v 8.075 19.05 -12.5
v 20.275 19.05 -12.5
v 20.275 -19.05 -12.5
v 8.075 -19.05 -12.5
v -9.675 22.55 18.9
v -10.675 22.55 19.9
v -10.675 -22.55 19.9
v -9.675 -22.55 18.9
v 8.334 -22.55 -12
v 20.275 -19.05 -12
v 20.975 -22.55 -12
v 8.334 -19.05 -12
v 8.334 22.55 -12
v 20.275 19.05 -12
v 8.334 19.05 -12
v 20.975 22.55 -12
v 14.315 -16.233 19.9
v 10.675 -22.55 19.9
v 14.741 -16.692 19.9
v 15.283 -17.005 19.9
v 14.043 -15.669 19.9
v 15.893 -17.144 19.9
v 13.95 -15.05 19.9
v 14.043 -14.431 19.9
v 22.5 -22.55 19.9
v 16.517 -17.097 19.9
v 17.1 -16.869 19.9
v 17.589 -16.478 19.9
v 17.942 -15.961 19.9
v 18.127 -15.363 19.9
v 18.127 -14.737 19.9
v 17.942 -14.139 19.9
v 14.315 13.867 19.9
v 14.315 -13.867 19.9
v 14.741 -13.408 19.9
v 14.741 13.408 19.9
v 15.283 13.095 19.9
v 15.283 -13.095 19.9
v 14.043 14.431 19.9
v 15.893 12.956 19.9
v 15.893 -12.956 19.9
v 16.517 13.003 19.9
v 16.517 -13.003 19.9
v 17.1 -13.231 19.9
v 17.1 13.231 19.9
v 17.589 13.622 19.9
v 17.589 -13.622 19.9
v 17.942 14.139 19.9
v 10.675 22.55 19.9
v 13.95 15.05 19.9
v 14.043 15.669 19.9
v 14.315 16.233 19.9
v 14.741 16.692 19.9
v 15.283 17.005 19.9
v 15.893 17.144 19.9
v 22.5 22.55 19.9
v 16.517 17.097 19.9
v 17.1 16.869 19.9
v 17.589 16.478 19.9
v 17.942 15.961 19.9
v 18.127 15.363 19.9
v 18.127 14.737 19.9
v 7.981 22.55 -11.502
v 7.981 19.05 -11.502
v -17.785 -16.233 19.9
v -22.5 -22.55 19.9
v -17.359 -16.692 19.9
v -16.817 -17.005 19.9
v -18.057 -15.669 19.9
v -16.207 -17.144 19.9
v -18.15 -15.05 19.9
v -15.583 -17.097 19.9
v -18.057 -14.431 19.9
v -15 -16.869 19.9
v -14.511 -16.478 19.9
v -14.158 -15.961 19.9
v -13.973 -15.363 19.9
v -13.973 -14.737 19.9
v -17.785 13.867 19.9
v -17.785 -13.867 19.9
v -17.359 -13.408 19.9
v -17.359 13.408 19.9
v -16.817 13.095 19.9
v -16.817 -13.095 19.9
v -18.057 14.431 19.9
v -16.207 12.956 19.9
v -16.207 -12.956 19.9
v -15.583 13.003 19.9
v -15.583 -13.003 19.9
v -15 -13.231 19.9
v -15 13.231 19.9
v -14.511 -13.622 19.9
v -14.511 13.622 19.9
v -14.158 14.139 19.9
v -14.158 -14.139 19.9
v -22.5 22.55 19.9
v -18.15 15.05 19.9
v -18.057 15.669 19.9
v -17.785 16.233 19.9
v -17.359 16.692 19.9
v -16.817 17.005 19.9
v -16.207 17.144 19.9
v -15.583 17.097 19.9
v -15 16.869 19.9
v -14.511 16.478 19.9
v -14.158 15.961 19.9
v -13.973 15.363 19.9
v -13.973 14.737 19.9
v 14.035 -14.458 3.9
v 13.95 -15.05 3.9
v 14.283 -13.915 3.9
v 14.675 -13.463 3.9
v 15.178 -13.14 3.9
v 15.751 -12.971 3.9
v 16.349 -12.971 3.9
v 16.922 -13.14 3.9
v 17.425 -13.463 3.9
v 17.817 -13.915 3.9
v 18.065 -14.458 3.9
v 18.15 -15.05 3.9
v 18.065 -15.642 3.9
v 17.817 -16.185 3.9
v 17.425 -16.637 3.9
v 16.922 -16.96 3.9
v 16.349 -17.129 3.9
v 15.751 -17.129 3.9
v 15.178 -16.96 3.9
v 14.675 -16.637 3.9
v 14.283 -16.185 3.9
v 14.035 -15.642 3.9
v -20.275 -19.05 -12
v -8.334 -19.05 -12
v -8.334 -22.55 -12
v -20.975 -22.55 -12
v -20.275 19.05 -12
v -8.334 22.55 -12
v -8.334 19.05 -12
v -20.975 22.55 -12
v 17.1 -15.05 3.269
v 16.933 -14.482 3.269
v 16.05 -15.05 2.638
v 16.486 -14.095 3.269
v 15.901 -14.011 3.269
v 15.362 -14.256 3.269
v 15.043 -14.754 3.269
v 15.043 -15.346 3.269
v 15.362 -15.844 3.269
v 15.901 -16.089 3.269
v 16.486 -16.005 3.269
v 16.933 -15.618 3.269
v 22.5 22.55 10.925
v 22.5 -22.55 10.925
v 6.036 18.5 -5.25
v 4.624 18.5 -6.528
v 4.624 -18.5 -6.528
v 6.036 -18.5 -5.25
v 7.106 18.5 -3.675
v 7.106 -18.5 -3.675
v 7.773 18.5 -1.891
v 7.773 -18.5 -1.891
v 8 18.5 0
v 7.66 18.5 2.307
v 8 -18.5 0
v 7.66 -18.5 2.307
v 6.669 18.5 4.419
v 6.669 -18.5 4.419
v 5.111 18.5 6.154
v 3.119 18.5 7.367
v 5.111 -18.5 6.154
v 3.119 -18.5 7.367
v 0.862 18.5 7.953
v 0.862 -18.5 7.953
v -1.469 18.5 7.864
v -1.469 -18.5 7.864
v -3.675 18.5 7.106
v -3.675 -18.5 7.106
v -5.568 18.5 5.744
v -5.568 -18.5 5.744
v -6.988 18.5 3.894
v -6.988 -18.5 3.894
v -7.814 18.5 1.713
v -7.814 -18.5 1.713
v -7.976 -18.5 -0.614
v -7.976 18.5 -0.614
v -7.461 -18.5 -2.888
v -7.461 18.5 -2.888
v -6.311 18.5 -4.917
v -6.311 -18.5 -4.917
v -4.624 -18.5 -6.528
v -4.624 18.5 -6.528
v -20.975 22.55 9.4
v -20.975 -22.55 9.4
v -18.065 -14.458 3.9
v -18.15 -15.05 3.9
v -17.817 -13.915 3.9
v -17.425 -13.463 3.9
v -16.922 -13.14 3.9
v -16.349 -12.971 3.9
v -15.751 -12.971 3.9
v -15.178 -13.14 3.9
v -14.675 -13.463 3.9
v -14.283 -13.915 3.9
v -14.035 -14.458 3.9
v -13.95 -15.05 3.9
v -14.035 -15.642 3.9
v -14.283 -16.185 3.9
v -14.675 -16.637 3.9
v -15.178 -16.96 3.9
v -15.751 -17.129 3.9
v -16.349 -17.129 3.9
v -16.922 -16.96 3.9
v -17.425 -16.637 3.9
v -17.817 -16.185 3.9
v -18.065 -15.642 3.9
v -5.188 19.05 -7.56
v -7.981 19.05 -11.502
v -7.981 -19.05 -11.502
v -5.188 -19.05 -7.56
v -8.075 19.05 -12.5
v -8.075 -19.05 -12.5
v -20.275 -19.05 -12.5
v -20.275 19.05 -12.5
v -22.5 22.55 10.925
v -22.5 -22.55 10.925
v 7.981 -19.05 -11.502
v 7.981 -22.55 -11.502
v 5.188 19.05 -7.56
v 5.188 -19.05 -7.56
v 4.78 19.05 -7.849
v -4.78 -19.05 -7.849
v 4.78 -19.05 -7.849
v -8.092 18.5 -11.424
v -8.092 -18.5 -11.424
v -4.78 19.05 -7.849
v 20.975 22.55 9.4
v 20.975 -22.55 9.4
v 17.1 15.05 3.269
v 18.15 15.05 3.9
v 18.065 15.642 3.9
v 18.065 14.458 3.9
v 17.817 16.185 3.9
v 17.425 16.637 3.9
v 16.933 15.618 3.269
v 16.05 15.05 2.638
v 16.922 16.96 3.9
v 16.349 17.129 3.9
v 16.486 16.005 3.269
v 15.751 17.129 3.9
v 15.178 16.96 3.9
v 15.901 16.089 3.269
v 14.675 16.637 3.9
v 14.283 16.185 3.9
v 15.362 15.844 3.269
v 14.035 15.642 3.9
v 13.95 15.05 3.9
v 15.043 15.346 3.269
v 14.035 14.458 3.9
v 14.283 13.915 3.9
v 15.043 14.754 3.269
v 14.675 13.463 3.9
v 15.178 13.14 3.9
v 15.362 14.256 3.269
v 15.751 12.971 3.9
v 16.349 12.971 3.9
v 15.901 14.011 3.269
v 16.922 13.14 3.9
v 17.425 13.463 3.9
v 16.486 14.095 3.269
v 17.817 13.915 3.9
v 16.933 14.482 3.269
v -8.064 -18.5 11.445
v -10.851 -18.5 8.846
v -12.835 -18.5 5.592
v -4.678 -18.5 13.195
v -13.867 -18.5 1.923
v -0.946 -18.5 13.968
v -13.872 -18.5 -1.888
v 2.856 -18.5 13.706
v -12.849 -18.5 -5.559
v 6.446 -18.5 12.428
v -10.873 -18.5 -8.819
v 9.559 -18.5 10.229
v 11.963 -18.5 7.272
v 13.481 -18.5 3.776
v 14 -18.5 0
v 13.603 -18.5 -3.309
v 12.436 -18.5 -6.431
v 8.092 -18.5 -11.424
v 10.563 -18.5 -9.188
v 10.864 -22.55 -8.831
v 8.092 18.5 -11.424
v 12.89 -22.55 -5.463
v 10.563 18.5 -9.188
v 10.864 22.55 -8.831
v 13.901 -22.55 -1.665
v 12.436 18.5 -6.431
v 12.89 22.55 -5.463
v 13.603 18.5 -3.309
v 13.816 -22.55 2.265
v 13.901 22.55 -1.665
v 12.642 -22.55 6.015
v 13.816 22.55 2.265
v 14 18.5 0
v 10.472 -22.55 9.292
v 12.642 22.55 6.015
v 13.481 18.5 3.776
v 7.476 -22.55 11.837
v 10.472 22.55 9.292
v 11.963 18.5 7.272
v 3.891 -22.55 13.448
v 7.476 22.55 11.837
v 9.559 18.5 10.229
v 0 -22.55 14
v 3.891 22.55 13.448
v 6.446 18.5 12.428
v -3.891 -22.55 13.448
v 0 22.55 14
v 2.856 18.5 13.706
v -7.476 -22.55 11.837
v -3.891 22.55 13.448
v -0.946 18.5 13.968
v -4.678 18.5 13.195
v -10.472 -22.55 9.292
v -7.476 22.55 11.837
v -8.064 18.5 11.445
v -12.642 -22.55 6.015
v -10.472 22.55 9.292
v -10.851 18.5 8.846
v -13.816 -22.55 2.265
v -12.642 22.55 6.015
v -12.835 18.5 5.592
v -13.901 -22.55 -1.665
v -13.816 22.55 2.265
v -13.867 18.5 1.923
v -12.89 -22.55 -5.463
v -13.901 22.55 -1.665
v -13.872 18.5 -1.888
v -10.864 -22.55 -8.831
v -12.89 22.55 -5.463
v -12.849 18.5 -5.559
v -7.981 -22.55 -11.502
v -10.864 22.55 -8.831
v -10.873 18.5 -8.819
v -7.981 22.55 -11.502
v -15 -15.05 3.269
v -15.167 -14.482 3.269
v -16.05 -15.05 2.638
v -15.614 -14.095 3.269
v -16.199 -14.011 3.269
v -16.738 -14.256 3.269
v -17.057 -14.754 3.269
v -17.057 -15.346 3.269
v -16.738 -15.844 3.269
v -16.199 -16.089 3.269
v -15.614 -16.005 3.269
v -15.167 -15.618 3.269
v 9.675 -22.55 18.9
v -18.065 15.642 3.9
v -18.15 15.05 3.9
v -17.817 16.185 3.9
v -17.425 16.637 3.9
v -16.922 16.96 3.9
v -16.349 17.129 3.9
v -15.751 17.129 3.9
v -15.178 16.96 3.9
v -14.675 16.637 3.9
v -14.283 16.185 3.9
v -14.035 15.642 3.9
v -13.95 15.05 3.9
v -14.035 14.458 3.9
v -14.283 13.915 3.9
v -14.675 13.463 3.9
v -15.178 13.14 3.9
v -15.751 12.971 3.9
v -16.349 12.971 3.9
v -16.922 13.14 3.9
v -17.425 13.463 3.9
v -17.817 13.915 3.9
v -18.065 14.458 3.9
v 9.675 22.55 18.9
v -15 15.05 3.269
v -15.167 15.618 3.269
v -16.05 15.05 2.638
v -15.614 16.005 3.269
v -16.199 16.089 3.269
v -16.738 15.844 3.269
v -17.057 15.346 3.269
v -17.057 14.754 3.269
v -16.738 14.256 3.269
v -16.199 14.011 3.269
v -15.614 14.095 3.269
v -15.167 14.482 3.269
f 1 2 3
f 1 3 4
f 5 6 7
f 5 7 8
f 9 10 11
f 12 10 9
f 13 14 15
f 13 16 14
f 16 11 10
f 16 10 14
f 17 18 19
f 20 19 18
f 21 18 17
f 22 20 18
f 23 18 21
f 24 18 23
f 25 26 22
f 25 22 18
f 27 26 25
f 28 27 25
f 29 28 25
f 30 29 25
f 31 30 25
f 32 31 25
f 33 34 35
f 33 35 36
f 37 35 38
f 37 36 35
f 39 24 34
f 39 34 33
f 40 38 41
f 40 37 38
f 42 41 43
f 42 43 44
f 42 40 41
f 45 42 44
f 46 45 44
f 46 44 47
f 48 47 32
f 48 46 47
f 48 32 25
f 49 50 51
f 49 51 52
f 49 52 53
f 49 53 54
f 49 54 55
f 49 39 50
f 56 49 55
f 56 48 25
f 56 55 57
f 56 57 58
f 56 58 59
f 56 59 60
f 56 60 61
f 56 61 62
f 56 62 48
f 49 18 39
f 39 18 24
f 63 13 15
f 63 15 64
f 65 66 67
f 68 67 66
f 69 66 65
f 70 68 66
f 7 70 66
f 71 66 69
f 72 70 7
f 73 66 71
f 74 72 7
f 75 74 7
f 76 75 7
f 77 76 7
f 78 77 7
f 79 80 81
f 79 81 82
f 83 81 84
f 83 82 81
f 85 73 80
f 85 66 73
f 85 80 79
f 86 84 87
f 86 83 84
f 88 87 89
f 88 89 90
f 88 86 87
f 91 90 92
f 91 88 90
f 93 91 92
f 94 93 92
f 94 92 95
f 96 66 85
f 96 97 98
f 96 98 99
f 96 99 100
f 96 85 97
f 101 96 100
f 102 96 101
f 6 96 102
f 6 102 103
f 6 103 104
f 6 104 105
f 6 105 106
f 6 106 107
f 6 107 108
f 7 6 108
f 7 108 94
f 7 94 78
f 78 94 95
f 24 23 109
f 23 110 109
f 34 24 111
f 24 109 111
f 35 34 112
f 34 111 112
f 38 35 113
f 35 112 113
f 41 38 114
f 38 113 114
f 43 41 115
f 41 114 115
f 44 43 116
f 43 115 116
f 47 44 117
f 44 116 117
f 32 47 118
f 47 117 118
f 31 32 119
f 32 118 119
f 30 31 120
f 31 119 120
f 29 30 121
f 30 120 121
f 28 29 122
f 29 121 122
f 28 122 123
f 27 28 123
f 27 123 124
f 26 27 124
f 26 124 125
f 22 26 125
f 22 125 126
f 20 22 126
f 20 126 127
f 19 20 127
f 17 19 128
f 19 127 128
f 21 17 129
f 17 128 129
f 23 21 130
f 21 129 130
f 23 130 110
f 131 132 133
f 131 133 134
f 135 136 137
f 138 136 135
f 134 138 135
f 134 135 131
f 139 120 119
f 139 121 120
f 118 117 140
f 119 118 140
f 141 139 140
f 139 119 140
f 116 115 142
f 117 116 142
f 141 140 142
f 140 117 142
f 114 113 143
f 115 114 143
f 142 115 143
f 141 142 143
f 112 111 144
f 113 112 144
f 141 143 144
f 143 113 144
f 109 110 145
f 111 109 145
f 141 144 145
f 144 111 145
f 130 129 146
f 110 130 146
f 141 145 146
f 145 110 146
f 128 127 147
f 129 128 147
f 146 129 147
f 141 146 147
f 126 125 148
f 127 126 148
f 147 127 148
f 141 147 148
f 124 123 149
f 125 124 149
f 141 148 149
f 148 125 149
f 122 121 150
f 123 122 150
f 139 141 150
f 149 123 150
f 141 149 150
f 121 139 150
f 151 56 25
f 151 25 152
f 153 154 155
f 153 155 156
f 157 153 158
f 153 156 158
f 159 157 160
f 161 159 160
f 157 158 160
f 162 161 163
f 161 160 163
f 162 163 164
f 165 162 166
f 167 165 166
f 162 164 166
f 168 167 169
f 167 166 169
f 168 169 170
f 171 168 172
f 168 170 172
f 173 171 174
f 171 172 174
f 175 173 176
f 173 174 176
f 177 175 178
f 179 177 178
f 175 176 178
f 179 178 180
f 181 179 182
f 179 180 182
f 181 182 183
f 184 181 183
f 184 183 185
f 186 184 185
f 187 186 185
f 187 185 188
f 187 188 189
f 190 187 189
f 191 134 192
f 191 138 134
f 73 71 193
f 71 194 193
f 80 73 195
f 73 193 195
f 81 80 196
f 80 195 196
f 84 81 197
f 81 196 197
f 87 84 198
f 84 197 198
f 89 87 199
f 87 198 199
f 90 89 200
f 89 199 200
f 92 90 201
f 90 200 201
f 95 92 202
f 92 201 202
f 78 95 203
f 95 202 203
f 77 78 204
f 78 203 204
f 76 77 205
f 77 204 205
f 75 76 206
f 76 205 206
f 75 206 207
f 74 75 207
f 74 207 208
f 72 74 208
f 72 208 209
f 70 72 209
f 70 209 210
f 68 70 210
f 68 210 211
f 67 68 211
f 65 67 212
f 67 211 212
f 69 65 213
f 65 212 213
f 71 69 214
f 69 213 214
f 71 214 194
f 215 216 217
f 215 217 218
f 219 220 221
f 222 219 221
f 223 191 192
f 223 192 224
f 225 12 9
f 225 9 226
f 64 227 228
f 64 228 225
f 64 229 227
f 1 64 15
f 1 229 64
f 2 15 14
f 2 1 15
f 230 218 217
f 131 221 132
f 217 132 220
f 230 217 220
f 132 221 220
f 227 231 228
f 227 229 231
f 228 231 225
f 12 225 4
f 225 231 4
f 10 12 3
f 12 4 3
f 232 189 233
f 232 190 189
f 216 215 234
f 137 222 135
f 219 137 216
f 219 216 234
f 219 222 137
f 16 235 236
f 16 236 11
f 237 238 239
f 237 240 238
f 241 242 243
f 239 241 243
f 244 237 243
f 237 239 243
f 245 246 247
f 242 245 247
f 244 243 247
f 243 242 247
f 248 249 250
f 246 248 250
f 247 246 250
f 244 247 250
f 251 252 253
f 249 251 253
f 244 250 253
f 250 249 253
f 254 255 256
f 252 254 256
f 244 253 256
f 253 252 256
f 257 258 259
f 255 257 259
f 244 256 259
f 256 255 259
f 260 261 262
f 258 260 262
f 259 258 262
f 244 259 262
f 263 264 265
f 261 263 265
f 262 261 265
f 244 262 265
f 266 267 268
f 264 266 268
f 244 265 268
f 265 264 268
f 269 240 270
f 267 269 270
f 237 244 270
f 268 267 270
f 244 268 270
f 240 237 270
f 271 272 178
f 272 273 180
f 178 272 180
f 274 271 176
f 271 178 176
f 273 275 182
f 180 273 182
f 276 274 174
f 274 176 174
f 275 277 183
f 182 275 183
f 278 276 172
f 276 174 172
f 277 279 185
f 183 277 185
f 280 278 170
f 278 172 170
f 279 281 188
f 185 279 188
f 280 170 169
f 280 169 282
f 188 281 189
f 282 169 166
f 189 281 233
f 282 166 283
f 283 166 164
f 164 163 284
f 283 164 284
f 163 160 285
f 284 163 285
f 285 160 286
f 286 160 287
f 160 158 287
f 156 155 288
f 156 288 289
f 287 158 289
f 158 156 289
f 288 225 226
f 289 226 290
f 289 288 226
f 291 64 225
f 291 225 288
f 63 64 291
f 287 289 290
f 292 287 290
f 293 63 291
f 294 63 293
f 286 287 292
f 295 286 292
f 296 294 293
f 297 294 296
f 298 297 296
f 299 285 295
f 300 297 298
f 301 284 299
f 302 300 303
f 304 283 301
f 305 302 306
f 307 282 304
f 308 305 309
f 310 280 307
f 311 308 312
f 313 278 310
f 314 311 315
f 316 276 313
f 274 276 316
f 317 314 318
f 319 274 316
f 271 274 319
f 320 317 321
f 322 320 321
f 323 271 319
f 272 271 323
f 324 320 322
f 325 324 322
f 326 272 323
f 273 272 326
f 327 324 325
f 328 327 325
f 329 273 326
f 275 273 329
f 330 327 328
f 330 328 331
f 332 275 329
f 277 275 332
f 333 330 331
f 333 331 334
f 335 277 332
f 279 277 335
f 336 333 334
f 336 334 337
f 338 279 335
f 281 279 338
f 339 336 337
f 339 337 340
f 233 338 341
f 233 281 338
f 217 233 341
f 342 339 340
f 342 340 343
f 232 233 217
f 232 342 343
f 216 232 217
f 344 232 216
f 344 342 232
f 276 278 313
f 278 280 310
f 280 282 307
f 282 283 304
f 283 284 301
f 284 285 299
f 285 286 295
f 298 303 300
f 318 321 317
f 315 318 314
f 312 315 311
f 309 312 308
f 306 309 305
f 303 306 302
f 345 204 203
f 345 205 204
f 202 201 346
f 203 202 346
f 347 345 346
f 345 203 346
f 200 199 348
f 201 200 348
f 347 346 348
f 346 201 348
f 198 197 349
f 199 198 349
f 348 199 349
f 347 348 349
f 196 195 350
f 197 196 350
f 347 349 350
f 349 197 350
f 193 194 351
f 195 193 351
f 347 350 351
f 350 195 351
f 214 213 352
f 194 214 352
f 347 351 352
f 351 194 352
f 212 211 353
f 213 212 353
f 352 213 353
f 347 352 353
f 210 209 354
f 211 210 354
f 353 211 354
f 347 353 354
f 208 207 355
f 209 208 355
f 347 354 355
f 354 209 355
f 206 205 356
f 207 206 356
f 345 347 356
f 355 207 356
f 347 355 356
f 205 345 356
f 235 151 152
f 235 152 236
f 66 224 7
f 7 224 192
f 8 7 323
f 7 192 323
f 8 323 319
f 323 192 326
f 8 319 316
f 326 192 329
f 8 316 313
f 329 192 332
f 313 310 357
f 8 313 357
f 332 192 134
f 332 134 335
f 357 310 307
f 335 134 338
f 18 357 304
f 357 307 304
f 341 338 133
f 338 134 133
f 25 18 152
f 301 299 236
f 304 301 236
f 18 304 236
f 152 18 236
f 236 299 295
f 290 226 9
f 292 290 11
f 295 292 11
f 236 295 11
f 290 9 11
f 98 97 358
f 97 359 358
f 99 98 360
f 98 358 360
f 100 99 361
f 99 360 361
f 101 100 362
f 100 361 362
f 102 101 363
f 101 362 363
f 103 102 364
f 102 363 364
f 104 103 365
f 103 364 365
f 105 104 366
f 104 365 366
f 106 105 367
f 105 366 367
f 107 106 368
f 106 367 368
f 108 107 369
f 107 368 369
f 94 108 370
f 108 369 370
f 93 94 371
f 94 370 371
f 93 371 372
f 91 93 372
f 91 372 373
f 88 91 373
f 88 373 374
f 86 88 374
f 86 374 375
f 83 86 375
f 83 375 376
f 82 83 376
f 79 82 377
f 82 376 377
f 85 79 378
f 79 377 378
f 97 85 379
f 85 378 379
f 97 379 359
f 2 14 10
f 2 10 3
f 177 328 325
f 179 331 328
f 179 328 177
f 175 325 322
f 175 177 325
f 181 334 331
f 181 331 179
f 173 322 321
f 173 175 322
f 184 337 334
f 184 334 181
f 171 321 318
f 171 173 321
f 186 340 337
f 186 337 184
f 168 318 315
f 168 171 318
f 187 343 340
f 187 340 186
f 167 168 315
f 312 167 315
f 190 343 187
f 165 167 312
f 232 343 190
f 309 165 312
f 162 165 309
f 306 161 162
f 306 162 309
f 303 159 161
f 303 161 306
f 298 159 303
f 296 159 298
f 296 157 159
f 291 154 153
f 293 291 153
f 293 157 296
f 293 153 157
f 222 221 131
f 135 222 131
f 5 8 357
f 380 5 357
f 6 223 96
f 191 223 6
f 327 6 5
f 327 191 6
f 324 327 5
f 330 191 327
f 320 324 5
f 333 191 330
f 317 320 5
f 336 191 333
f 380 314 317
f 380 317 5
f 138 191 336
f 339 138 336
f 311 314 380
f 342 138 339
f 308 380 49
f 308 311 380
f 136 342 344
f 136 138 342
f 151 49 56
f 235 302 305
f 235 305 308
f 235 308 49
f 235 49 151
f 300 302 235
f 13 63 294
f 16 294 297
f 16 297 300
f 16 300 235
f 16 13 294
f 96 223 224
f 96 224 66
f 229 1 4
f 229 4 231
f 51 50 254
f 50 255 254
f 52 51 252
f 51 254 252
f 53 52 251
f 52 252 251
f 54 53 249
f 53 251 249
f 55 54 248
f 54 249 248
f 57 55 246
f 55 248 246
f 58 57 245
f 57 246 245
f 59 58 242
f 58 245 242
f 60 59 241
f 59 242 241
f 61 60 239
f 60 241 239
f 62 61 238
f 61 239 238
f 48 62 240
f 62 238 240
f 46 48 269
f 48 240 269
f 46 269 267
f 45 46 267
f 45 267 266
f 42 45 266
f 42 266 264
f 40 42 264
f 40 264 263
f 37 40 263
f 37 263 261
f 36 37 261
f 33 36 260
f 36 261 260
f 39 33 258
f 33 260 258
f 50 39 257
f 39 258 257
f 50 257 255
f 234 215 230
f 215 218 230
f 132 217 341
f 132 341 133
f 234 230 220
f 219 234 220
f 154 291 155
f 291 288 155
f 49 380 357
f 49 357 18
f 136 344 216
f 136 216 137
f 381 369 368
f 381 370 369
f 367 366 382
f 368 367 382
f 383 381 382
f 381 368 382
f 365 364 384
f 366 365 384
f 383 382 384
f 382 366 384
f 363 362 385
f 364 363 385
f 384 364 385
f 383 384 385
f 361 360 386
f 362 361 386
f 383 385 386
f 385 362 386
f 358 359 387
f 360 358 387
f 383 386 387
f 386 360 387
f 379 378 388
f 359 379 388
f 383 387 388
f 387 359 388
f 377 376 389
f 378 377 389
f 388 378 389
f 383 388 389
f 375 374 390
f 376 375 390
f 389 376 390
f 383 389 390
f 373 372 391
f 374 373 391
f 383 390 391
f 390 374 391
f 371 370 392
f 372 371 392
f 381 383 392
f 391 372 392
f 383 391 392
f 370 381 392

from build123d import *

# Parameters (mm, degrees)
MAIN_BODY_DEPTH             = 22.55
RUBBER_BEARING_SLEEVE_DEPTH = 18.5
BOSS_EXTRUDE3_DEPTH         = 19.05
M5X0_8_TAPPED_HOLE1_D       = 4.2
M5X0_8_TAPPED_HOLE1_DEPTH   = 16
M5X0_8_TAPPED_HOLE1_TIP     = 1.2618073


with BuildPart() as part:
    # Sketch1 → Main Body (new, symmetric)
    with BuildSketch(Plane(origin=(0, 0, 0), x_dir=(1, 0, 0), z_dir=(0, 1, 0))):
        with BuildLine():
            Line((-20.975, 12), (-20.975, -9.4))
            Line((-20.975, -9.4), (-22.5, -10.925))
            Line((-22.5, -10.925), (-22.5, -19.9))
            Line((-22.5, -19.9), (-10.675, -19.9))
            Line((-10.675, -19.9), (-9.675, -18.9))
            Line((-9.675, -18.9), (9.675, -18.9))
            Line((9.675, -18.9), (10.675, -19.9))
            Line((10.675, -19.9), (22.5, -19.9))
            Line((22.5, -19.9), (22.5, -10.925))
            Line((22.5, -10.925), (20.975, -9.4))
            Line((20.975, -9.4), (20.975, 12))
            Line((20.975, 12), (8.333560049, 12))
            Line((8.333560049, 12), (7.981030265, 11.502310894))
            ThreePointArc((7.981030265, 11.502310894), (0, -14), (-7.981030265, 11.502310894))
            Line((-7.981030265, 11.502310894), (-8.333560049, 12))
            Line((-8.333560049, 12), (-20.975, 12))
        make_face()
    extrude(amount=MAIN_BODY_DEPTH, both=True)

    # Sketch1<3> → Rubber Bearing Sleeve (add, symmetric)
    with BuildSketch(Plane(origin=(0, 0, 0), x_dir=(1, 0, 0), z_dir=(0, 1, 0))):
        with BuildLine():
            Line((-4.624138726, 6.528195849), (-8.092242771, 11.424342735))
            ThreePointArc((-8.092242771, 11.424342735), (-6.430730954, -12.435662403), (14, 0))
            ThreePointArc((14, 0), (12.435662403, 6.430730954), (8.092242771, 11.424342735))
            Line((8.092242771, 11.424342735), (4.624138726, 6.528195849))
            ThreePointArc((4.624138726, 6.528195849), (7.106092802, 3.674703402), (8, 0))
            ThreePointArc((8, 0), (-3.674703402, -7.106092802), (-4.624138726, 6.528195849))
        make_face()
    extrude(amount=RUBBER_BEARING_SLEEVE_DEPTH, both=True)

    # Sketch1<4> → Boss-Extrude3 (add, symmetric)
    with BuildSketch(Plane(origin=(0, 0, 0), x_dir=(1, 0, 0), z_dir=(0, 1, 0))):
        Polygon((-20.275, 12.5), (-20.275, 12), (-8.333560049, 12), (-5.188313398, 7.559651787), (-4.780301158, 7.848660458), (-8.075, 12.5), align=None)
        Polygon((8.333560049, 12), (20.275, 12), (20.275, 12.5), (8.075, 12.5), (4.780301158, 7.848660458), (5.188313398, 7.559651787), align=None)
    extrude(amount=BOSS_EXTRUDE3_DEPTH, both=True)

    # M5x0.8 Tapped Hole1
    with Locations(Plane.XY.offset(19.9)):
        with Locations((-16.05, 15.05), (16.05, 15.05), (16.05, -15.05), (-16.05, -15.05)):
            Hole(M5X0_8_TAPPED_HOLE1_D / 2, depth=M5X0_8_TAPPED_HOLE1_DEPTH)
            with Locations((0, 0, -(M5X0_8_TAPPED_HOLE1_DEPTH + M5X0_8_TAPPED_HOLE1_TIP / 2))):  # 118° drill point
                Cone(0, M5X0_8_TAPPED_HOLE1_D / 2, M5X0_8_TAPPED_HOLE1_TIP, mode=Mode.SUBTRACT)


solid = part.part
